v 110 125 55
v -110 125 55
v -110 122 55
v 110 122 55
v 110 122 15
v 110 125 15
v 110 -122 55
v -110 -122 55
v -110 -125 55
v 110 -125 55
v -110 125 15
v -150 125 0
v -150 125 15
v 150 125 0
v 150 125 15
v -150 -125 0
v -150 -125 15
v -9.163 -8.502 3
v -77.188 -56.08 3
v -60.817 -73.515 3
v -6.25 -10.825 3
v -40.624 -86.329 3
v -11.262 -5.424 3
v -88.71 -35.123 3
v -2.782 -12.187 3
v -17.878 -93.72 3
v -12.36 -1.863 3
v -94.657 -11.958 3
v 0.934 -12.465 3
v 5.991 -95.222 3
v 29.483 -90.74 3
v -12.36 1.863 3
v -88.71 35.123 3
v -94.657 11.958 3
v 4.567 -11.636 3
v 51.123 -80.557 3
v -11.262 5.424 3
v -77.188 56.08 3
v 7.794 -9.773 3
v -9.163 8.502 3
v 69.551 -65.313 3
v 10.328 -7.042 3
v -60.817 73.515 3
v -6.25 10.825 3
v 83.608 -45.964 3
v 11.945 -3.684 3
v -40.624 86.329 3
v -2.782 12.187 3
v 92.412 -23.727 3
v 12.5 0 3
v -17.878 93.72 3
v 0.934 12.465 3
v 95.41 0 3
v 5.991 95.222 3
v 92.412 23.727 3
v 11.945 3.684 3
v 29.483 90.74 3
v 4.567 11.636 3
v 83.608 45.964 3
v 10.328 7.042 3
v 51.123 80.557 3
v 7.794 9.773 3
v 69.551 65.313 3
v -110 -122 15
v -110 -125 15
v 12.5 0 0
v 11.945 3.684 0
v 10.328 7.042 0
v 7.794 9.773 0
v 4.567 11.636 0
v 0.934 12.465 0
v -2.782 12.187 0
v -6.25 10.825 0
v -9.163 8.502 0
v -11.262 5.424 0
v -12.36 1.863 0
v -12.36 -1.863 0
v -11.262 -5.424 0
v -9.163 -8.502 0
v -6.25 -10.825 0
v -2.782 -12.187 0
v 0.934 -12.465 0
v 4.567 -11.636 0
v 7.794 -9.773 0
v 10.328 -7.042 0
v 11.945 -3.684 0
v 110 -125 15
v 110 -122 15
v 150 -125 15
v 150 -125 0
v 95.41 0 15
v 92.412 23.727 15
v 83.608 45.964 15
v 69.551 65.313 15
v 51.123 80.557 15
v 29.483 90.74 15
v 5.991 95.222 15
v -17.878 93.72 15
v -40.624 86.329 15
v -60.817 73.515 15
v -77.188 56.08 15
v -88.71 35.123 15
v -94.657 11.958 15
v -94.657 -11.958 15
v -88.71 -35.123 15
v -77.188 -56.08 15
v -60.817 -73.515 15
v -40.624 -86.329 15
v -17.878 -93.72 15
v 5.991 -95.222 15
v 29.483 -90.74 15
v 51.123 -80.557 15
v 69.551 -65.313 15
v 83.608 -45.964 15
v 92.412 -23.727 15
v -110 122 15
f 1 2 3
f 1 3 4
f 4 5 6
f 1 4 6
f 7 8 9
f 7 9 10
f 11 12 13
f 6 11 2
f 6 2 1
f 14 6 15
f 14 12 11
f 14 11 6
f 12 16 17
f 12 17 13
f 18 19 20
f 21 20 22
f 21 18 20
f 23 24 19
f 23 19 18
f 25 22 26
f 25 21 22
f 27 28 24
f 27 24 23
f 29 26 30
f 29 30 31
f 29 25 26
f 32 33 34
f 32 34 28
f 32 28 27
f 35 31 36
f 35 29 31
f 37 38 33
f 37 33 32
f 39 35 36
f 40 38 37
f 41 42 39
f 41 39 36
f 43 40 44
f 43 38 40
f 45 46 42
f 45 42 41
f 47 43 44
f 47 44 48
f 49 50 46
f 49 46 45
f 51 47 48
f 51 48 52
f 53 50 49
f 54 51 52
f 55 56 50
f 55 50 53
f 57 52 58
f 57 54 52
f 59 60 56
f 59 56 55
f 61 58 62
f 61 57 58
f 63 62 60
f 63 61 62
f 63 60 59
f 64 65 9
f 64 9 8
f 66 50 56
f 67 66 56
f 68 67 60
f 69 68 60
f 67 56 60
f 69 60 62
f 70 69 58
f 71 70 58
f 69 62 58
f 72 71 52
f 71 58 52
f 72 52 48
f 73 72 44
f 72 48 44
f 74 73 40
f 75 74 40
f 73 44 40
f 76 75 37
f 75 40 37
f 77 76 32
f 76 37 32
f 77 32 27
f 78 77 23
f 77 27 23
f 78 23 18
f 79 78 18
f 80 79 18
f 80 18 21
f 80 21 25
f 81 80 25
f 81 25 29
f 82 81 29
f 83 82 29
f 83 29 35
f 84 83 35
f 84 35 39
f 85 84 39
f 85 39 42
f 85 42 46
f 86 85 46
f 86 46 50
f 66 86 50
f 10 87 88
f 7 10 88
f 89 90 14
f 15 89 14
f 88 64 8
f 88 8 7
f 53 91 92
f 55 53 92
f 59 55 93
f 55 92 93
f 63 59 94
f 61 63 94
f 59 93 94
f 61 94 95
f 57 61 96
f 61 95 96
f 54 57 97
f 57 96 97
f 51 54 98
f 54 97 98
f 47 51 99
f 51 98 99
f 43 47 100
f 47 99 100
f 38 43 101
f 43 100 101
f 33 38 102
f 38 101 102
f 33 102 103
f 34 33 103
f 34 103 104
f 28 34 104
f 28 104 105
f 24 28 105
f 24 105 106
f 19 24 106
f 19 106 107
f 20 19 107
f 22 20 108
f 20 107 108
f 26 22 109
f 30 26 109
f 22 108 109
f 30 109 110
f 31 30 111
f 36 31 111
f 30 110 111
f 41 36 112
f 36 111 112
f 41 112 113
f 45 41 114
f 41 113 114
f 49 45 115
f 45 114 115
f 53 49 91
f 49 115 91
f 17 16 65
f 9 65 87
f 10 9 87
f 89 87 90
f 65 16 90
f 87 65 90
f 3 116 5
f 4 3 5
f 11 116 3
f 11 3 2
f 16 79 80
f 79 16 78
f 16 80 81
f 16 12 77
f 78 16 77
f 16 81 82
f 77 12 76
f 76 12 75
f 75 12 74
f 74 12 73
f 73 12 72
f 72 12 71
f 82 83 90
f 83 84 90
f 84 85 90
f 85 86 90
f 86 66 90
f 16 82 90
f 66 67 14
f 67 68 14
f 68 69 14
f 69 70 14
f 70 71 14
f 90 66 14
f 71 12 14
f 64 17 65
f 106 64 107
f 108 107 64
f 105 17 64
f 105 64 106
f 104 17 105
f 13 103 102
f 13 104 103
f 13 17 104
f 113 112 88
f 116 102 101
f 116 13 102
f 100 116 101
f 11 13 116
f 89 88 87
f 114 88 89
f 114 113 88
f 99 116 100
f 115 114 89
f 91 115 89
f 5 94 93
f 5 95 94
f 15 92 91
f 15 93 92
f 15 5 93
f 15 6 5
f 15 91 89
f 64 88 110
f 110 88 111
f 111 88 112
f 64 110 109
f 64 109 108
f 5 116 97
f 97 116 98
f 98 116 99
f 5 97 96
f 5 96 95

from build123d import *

# Parameters (mm, degrees)
F0_W     = 300
F0_H     = 250
F1_DEPTH = 15
F2_R     = 95.409832
F3_DEPTH = 12
F4_R     = 12.5
F5_DEPTH = 15.001
F6_W     = 220
F6_H     = 3
F7_DEPTH = 40


with BuildPart() as f1:
    # F0 (on Top) → F1 (new body)
    with BuildSketch(Plane.XY):
        Rectangle(F0_W, F0_H)
    extrude(amount=F1_DEPTH)

    # F2 (on face) → F3 (cut)
    with BuildSketch(Plane.XY.offset(15)):
        Circle(F2_R)
    extrude(amount=-F3_DEPTH, mode=Mode.SUBTRACT)

    # F4 (on face) → F5 (cut, through all)
    with BuildSketch(Plane.XY.offset(15)):
        Circle(F4_R)
    extrude(amount=-F5_DEPTH, mode=Mode.SUBTRACT)

    # F6 (on face) → F7 (join)
    with BuildSketch(Plane.XY.offset(15)):
        with Locations((0, 123.5)):
            Rectangle(F6_W, F6_H)
        with Locations((0, -123.5)):
            Rectangle(F6_W, F6_H)
    extrude(amount=F7_DEPTH)


solid = f1.part
